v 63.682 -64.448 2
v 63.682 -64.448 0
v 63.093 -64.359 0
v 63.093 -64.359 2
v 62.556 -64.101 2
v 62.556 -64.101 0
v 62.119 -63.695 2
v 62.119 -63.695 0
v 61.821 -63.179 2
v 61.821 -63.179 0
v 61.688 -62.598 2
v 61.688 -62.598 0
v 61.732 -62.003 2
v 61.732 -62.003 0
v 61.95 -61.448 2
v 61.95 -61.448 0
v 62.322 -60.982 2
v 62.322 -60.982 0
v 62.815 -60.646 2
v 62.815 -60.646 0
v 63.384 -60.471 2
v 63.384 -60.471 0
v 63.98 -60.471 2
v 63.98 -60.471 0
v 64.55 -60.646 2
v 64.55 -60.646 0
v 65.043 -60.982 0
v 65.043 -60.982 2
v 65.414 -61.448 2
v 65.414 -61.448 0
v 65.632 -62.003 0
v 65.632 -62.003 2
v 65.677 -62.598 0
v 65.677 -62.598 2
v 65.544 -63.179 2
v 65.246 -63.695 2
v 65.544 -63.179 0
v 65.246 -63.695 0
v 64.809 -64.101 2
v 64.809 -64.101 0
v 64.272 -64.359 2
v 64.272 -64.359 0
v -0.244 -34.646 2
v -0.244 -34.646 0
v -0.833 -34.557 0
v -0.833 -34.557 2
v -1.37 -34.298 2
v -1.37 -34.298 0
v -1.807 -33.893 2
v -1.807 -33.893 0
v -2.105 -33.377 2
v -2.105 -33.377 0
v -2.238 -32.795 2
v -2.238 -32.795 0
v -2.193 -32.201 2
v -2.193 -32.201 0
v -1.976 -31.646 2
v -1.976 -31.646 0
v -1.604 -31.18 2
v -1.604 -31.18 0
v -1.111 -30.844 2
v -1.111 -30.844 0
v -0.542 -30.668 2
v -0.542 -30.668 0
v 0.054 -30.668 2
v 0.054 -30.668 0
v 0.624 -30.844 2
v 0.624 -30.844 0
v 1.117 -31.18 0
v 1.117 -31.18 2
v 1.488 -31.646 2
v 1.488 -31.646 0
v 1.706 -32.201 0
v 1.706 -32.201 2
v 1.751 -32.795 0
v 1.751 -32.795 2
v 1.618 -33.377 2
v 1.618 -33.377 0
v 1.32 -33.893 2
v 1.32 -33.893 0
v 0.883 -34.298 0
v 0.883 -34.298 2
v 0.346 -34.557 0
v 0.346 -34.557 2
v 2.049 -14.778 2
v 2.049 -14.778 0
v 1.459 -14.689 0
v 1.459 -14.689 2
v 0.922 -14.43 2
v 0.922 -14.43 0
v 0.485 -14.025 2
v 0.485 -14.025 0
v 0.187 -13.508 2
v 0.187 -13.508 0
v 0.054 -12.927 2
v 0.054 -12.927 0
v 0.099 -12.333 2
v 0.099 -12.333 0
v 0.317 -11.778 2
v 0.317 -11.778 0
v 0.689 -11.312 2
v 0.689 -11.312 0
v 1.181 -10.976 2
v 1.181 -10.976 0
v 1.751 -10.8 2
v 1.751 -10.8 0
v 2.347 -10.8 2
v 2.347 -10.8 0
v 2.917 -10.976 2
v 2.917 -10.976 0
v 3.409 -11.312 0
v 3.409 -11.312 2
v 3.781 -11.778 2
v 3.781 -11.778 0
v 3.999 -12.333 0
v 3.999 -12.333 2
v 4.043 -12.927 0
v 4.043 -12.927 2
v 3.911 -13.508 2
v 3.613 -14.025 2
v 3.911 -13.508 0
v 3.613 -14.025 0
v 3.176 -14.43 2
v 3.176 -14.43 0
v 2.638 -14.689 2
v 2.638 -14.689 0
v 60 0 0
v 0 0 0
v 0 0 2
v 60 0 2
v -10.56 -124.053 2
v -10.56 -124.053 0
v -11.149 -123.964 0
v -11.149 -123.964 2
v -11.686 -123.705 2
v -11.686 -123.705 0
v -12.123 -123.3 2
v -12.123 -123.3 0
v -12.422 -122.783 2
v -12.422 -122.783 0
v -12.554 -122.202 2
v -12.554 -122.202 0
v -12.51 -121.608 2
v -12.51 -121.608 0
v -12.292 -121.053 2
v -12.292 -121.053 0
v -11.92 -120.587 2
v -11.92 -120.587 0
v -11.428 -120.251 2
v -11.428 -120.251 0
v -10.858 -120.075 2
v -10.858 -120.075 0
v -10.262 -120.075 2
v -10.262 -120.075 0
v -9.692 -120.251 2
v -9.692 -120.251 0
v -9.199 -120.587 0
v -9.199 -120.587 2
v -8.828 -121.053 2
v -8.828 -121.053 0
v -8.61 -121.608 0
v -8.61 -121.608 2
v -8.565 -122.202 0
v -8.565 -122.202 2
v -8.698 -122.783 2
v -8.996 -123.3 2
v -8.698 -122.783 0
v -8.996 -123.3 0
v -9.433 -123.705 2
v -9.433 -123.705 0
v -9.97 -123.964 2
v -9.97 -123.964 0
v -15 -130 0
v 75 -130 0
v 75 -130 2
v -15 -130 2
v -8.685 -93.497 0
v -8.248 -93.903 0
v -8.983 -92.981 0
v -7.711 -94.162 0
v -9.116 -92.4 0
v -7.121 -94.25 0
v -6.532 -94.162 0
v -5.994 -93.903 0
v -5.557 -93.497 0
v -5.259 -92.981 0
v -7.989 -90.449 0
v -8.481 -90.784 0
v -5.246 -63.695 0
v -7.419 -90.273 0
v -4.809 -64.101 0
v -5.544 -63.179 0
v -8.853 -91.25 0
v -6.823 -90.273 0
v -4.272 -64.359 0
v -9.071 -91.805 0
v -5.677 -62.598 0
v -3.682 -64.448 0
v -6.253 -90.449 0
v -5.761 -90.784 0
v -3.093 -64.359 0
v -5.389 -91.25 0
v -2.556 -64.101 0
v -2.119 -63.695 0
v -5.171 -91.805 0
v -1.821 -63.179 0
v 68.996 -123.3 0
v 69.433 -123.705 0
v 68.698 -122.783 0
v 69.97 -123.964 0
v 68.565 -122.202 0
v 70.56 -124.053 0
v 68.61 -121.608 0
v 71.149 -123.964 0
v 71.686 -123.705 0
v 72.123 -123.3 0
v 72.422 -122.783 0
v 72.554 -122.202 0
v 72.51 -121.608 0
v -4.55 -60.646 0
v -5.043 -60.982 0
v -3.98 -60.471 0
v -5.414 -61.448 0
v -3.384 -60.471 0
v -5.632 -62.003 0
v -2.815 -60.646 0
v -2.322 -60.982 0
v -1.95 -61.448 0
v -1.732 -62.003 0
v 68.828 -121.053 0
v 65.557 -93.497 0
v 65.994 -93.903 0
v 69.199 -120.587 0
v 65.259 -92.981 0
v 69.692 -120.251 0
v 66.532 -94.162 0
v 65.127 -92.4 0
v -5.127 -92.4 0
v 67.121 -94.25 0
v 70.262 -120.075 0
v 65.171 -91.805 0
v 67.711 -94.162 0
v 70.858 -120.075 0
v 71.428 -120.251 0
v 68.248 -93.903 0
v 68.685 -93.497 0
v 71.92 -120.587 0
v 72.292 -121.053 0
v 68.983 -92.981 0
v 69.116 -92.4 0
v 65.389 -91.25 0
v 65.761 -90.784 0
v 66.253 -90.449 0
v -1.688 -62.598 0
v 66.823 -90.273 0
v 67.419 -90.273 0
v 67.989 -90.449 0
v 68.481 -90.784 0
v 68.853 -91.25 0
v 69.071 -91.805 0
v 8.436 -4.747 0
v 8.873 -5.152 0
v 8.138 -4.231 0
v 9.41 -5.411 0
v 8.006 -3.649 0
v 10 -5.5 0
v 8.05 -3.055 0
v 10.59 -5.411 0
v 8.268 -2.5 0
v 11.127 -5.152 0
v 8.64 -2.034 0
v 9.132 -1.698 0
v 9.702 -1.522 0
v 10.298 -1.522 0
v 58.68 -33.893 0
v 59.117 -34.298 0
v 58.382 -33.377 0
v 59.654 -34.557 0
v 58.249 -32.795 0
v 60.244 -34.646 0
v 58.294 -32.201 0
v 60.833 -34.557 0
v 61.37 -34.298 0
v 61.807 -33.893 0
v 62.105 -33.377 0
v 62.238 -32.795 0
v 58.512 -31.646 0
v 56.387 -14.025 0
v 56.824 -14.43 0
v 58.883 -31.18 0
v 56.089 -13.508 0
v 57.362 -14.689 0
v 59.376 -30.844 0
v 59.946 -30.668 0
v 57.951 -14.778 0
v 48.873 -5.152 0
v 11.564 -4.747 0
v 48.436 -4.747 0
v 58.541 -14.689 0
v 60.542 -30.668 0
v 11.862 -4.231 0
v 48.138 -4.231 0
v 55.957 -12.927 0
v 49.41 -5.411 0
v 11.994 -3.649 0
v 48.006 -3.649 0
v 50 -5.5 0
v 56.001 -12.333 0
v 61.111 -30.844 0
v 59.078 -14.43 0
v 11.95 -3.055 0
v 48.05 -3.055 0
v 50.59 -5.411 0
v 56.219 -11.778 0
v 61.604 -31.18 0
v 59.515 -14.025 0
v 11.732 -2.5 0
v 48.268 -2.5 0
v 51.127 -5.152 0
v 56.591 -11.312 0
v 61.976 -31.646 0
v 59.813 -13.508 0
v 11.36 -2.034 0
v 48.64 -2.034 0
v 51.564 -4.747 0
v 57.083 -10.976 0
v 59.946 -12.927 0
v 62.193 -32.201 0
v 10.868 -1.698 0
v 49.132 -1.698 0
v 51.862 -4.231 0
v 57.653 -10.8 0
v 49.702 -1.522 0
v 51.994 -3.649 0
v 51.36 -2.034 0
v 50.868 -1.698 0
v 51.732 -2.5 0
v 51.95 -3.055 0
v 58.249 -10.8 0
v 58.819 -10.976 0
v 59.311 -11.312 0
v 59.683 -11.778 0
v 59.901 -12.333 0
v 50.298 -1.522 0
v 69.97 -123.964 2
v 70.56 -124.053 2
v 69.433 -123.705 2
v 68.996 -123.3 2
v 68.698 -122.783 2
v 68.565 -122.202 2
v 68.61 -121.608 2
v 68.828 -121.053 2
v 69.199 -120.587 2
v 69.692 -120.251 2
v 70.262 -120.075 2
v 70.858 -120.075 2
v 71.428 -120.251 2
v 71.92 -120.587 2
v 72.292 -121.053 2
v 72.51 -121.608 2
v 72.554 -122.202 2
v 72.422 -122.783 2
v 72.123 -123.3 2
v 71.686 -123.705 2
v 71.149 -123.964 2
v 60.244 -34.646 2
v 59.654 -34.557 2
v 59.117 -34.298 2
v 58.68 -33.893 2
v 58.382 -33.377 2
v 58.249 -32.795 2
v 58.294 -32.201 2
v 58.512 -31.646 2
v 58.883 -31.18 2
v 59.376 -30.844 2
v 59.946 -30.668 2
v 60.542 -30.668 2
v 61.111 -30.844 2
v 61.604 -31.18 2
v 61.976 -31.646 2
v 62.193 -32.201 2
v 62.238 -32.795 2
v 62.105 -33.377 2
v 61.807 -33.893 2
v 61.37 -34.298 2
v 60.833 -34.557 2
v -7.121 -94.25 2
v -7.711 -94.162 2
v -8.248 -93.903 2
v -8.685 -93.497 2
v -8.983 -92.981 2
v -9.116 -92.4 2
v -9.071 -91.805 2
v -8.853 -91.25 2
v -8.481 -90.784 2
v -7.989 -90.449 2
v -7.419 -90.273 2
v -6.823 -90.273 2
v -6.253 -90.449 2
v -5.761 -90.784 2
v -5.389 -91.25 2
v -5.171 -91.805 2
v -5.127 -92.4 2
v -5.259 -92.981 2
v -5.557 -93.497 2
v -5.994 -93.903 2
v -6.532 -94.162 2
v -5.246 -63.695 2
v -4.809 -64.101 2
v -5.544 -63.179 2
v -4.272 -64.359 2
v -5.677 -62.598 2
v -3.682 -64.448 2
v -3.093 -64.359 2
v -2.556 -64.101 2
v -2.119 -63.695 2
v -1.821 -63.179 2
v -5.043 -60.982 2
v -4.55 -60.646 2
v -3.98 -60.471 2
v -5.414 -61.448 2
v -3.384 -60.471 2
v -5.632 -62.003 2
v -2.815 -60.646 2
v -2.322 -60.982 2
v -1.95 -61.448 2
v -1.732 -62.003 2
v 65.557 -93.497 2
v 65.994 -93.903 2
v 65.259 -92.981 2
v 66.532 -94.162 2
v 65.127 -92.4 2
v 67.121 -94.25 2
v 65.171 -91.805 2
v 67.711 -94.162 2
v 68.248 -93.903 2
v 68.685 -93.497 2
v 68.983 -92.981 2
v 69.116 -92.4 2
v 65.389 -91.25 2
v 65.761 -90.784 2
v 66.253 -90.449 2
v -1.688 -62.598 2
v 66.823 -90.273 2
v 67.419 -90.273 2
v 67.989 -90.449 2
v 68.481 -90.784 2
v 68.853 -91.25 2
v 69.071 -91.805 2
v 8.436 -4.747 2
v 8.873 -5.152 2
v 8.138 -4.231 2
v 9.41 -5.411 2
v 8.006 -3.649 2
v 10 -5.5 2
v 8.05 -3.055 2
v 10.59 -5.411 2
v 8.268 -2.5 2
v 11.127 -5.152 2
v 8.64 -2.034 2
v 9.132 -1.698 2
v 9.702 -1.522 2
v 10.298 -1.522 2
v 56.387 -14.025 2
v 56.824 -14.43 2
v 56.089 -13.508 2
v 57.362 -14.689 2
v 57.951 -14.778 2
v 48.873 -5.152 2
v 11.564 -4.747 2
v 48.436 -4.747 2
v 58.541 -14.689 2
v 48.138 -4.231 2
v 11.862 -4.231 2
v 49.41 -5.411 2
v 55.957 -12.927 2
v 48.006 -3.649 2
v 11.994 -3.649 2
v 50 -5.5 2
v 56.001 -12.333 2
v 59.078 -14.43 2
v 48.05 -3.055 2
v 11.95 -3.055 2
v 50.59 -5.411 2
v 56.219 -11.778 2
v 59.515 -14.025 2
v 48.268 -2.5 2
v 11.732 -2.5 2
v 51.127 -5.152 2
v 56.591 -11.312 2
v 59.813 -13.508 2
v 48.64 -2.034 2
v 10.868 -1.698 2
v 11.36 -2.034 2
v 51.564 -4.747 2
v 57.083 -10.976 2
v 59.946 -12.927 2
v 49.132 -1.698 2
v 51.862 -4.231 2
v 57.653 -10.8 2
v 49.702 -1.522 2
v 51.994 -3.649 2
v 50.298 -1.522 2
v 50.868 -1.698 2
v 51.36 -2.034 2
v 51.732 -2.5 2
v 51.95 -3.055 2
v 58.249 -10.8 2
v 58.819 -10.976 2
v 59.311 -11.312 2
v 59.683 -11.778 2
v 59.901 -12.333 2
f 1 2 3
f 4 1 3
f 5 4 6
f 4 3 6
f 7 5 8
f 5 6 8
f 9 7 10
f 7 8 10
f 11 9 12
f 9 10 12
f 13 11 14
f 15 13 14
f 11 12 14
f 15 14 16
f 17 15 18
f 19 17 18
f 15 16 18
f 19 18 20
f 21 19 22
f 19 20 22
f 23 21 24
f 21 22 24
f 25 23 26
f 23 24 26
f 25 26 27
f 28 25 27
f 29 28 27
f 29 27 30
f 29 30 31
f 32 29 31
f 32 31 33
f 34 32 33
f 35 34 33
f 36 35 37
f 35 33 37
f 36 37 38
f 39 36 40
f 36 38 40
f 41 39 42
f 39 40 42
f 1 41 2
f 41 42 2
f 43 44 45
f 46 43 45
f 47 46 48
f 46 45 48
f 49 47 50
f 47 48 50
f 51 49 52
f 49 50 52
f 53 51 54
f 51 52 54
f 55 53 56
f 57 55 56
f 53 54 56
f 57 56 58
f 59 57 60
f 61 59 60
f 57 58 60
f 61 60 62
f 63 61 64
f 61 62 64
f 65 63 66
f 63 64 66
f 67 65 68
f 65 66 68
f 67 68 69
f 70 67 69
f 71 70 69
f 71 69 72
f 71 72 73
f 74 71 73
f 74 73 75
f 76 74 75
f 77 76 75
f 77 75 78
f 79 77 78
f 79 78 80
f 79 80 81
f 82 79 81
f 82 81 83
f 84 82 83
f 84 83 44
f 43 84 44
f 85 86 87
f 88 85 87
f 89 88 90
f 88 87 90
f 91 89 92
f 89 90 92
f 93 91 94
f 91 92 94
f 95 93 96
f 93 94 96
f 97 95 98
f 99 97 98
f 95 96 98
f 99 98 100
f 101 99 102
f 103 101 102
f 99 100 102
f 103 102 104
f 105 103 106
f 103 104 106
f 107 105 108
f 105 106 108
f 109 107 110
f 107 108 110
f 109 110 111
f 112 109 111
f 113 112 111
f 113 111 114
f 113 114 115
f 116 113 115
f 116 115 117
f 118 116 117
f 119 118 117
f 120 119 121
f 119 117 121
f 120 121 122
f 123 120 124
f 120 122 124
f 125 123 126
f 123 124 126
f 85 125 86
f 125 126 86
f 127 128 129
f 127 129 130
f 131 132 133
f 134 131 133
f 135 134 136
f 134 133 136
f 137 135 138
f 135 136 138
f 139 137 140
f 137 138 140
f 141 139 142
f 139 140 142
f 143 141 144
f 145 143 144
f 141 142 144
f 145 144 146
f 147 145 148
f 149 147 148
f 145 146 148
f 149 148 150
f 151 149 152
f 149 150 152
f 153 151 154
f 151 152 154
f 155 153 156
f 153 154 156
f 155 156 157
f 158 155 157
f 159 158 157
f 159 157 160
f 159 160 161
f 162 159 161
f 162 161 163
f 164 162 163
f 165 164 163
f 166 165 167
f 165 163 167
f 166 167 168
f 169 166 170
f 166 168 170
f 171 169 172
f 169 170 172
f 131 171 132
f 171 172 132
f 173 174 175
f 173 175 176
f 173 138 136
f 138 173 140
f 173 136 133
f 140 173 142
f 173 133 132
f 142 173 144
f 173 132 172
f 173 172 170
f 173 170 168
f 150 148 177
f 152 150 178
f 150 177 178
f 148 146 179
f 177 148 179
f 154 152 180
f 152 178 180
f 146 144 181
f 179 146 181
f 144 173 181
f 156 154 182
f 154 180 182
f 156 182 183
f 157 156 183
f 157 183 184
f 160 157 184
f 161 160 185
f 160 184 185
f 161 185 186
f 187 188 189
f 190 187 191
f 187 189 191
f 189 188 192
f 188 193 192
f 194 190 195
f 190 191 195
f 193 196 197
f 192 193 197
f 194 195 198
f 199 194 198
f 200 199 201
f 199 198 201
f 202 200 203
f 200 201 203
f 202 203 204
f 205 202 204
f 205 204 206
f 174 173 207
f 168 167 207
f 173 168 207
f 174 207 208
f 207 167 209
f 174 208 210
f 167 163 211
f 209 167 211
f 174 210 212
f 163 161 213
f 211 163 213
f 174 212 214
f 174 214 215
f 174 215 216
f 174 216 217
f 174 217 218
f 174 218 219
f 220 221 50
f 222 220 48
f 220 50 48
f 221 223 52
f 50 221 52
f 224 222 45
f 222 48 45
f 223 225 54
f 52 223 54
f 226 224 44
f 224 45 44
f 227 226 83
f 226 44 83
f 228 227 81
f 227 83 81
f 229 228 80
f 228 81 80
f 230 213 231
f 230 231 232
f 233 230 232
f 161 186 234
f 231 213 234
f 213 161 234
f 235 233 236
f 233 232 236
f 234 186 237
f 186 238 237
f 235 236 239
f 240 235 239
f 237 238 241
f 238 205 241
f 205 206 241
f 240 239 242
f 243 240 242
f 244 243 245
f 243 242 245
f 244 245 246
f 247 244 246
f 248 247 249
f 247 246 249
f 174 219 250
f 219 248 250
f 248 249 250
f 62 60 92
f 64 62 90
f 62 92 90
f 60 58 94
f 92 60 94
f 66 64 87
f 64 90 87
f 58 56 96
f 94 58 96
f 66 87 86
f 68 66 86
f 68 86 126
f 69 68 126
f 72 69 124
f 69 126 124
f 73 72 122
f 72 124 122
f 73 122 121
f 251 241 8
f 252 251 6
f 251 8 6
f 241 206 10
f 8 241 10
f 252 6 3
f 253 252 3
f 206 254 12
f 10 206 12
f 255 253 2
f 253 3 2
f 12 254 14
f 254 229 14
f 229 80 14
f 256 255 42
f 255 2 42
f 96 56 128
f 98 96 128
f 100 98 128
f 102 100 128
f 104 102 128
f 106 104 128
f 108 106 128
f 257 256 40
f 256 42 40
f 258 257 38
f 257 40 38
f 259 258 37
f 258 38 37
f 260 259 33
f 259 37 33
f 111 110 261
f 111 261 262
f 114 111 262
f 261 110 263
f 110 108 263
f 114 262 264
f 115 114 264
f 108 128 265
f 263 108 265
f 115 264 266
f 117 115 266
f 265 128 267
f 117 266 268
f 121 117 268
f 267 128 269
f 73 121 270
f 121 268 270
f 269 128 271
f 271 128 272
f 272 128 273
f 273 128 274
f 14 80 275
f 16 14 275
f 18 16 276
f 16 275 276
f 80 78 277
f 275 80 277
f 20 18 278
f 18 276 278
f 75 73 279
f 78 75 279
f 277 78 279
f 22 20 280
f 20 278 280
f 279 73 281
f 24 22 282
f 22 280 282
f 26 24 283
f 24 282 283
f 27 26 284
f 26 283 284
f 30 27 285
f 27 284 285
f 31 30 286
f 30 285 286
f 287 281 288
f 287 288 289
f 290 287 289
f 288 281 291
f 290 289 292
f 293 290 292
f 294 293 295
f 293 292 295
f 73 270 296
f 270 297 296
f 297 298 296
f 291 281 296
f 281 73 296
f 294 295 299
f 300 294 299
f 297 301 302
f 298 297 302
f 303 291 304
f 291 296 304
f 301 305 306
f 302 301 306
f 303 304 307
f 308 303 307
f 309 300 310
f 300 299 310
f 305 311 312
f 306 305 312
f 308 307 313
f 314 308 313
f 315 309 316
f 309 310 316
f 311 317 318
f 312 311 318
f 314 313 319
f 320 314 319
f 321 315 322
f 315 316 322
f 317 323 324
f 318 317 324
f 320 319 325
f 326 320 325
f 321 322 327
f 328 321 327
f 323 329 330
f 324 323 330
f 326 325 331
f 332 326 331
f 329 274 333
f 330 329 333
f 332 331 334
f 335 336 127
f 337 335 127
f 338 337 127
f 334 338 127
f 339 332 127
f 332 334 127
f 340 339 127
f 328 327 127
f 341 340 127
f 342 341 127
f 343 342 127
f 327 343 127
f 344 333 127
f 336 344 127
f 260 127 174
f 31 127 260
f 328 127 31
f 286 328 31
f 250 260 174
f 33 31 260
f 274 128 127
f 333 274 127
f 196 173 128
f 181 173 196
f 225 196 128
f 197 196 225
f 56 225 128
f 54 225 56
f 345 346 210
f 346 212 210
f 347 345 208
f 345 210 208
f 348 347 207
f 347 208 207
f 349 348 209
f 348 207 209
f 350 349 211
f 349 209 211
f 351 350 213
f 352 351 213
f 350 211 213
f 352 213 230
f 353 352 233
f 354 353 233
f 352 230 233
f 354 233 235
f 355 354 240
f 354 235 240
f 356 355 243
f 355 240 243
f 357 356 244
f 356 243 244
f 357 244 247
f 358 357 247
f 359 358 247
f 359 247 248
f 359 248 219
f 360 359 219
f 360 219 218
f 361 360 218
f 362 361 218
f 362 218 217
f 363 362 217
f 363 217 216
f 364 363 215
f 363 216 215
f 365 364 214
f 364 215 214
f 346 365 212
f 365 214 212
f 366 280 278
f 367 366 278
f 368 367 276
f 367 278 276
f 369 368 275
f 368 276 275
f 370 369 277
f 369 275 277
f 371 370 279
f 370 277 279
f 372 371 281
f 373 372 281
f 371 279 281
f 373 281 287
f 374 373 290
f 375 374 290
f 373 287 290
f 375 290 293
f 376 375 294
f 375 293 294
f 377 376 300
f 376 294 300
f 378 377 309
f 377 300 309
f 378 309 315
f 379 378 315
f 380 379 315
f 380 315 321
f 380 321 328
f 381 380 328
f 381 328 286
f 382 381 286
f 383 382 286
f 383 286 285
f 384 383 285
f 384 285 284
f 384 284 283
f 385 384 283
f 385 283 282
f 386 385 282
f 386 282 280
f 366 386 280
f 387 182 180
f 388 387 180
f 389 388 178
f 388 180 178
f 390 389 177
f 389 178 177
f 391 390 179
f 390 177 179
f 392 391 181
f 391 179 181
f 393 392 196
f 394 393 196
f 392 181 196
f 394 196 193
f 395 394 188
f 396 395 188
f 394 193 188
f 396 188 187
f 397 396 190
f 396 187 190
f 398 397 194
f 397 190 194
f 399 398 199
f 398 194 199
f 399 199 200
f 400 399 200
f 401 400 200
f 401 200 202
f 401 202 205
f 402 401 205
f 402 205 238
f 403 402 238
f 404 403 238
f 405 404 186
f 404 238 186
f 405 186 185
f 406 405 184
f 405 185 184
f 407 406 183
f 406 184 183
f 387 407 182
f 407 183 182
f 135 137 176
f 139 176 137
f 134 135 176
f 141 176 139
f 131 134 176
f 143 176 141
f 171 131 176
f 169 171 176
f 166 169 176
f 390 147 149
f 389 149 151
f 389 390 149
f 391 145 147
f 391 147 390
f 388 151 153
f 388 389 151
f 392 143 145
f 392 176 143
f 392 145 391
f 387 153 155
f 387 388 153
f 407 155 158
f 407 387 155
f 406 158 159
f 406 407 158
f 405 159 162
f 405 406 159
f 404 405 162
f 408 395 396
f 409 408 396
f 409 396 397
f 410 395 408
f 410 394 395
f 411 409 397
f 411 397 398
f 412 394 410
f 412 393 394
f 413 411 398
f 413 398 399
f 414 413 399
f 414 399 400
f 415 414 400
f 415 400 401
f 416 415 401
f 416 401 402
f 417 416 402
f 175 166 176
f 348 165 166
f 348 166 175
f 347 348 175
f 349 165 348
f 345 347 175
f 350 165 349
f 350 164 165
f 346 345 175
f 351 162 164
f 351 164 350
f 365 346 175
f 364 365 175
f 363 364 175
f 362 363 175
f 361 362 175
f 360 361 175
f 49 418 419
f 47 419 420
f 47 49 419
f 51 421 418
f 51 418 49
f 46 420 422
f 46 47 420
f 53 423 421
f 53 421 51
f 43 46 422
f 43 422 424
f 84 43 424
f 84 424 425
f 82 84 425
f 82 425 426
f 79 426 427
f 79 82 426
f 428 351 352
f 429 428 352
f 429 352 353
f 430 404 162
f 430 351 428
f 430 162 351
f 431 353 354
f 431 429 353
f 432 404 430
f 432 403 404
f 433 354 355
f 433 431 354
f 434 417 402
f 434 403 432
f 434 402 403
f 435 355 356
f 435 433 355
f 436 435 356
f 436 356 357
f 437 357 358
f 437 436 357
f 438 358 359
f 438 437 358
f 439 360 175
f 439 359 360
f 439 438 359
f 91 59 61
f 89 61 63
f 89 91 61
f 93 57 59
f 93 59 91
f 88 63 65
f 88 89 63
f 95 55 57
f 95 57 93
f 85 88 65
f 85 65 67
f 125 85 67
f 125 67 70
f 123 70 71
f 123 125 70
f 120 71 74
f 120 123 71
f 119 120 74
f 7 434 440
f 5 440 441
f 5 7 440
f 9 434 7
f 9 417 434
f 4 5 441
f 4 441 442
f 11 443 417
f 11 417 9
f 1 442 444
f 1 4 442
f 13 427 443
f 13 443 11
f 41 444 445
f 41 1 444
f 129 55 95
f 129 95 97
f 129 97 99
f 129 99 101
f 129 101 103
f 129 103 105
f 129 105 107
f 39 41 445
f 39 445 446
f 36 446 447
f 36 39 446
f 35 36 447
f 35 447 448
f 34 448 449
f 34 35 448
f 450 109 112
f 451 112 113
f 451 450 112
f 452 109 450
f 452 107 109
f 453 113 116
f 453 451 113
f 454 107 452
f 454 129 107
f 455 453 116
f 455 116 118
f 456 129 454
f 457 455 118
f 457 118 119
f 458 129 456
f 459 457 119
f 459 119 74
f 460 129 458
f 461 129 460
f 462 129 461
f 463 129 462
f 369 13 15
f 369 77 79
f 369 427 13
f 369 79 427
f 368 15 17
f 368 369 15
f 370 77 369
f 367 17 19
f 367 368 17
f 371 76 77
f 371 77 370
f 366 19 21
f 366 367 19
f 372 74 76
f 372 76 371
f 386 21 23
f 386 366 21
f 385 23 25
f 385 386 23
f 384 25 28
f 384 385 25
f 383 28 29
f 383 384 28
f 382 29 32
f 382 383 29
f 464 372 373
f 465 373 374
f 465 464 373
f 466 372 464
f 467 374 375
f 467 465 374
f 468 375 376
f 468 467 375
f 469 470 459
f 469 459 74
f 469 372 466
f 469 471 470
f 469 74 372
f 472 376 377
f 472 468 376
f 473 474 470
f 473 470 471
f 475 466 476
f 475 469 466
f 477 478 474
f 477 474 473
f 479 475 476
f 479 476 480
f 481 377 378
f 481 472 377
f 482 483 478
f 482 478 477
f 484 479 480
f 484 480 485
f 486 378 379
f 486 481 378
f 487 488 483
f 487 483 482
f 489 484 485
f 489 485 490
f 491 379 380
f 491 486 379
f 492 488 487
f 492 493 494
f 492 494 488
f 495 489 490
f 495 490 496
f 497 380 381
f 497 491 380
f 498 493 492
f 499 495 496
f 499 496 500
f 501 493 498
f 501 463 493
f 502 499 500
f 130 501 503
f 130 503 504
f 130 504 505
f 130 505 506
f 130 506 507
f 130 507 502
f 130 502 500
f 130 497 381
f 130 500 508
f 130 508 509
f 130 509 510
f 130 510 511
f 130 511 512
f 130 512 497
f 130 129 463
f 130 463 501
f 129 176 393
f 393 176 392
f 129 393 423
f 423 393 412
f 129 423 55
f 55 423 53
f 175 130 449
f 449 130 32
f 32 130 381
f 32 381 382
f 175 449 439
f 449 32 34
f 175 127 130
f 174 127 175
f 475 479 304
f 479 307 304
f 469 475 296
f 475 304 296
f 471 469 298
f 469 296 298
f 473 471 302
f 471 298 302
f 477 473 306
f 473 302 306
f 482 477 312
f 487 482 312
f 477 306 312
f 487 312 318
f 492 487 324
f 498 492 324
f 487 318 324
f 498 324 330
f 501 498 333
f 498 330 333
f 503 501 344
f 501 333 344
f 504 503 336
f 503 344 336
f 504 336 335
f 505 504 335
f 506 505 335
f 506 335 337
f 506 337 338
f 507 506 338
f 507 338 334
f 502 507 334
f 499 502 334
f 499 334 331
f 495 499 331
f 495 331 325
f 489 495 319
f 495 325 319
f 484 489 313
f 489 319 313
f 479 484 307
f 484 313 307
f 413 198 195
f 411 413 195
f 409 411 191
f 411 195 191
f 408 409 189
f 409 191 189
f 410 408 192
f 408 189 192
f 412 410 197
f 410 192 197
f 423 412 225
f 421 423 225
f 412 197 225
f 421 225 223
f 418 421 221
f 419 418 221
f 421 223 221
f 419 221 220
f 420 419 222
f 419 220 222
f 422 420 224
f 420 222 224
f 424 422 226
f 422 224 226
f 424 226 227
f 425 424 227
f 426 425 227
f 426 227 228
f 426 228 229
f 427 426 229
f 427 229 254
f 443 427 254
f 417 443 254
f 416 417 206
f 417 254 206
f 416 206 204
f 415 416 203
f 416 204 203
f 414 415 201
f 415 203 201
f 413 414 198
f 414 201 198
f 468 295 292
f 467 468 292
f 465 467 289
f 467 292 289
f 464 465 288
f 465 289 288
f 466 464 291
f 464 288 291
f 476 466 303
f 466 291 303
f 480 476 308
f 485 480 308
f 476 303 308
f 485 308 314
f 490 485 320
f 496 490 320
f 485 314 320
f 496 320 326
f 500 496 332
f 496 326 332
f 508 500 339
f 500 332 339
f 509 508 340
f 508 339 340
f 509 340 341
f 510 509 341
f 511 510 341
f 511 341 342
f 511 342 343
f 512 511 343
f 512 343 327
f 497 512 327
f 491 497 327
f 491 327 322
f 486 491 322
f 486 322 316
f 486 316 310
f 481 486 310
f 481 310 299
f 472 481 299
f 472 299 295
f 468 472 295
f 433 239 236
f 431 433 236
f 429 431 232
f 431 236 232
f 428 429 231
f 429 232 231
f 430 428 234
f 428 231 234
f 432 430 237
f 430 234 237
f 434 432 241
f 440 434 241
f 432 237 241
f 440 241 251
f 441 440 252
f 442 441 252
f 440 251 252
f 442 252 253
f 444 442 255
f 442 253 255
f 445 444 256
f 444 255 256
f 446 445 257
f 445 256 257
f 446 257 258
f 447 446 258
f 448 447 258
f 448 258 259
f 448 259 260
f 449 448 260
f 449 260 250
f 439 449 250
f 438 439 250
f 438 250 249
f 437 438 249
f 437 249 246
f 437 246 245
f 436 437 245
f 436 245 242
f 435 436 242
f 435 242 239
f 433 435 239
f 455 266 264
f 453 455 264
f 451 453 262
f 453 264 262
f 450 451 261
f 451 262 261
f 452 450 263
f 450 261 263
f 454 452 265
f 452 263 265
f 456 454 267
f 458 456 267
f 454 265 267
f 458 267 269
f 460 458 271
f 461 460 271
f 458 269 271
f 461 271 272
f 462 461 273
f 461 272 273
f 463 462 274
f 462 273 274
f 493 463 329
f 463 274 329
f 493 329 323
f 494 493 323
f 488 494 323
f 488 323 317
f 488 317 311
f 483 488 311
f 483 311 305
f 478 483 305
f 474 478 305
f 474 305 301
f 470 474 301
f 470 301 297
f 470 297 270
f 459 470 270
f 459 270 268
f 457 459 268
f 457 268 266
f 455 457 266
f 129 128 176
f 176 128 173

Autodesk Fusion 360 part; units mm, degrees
sketch "Sketch1" plane through (0, 0, 0) normal (0, 0, 1) x (1, 0, 0)
  line L0 (0, 0) -> (60, 0)
  line L1 (30, 0) -> (30, -130)
  line L2 (30, -130) -> (75, -130)
  line L3 (30, -130) -> (-15, -130)
  line L4 (0, 0) -> (-15, -130)
  line L5 (60, 0) -> (75, -130)
  dimension "d1" = 60
  dimension "d2" = 130
  dimension "d3" = 45
  dimension "d4" = 45
extrude "Extrude1" add sketch "Sketch1" along normal blind 2
sketch "Sketch2" plane through (0, 0, 2) normal (0, 0, 1) x (-1, 0, 0)
  line L0 (0, 0) -> (15, 130)
  line L1 (15, 130) -> (-75, 130)
  line L2 (-75, 130) -> (-60, 0)
  line L3 (-60, 0) -> (0, 0)
  line L4 (-30, 0) -> (-30, 3.5)
  line L5 (-60, 0) -> (-50, 0)
  line L6 (-50, 0) -> (-50, 3.5)
  line L7 (-30, 0) -> (-30, 130)
  line L8 (-62.991, 25.9222) -> (-59.5141, 26.3233)
  line L9 (-64.2385, 36.7338) -> (-60.7616, 37.135)
  line L10 (-59.5141, 26.3233) -> (-71.4768, 130)
  line L11 (-60.7616, 37.135) -> (-56.4649, 0)
  line L12 (-60.7616, 37.135) -> (-23.3789, 37.135) construction
  line L13 (-71.4768, 130) -> (-70.5598, 122.0527)
  line L14 (-70.5598, 122.0527) -> (-67.1211, 92.2505)
  line L15 (-67.1211, 92.2505) -> (-63.6823, 62.4482)
  line L16 (-63.6823, 62.4482) -> (-60.2436, 32.6459)
  line L17 (-60.2436, 32.6459) -> (-57.9511, 12.7777)
  point P0 (11.4768, 130)
  point P1 (10.5598, 122.0527)
  point P2 (7.1211, 92.2505)
  point P3 (3.6823, 62.4482)
  point P4 (0.2436, 32.6459)
  point P5 (-2.0489, 12.7777)
  point P6 (-10, 3.5)
  dimension "d7" = 3.5
  dimension "d8" = 10
  dimension "d9" = 3.5
  dimension "d10" = 3.5
  dimension "d11" = 3.5
  dimension "d12" = 83.4
  dimension "d13" = 8
  dimension "d14" = 30
  dimension "d15" = 30
  dimension "d16" = 30
  dimension "d17" = 20
hole "Hole1" at (10, -3.5, 2) at (2.0489, -12.7777, 2) at (-0.2436, -32.6459, 2) at (-3.6823, -62.4482, 2) at (-7.1211, -92.2505, 2) at (-10.5598, -122.0527, 2) at (50, -3.5, 2) at (57.9511, -12.7777, 2) at (63.6823, -62.4482, 2) at (67.1211, -92.2505, 2) at (70.5598, -122.0527, 2) at (60.2436, -32.6459, 2) direction (0, 0, -1) diameter 4 depth 50 tip angle 180
